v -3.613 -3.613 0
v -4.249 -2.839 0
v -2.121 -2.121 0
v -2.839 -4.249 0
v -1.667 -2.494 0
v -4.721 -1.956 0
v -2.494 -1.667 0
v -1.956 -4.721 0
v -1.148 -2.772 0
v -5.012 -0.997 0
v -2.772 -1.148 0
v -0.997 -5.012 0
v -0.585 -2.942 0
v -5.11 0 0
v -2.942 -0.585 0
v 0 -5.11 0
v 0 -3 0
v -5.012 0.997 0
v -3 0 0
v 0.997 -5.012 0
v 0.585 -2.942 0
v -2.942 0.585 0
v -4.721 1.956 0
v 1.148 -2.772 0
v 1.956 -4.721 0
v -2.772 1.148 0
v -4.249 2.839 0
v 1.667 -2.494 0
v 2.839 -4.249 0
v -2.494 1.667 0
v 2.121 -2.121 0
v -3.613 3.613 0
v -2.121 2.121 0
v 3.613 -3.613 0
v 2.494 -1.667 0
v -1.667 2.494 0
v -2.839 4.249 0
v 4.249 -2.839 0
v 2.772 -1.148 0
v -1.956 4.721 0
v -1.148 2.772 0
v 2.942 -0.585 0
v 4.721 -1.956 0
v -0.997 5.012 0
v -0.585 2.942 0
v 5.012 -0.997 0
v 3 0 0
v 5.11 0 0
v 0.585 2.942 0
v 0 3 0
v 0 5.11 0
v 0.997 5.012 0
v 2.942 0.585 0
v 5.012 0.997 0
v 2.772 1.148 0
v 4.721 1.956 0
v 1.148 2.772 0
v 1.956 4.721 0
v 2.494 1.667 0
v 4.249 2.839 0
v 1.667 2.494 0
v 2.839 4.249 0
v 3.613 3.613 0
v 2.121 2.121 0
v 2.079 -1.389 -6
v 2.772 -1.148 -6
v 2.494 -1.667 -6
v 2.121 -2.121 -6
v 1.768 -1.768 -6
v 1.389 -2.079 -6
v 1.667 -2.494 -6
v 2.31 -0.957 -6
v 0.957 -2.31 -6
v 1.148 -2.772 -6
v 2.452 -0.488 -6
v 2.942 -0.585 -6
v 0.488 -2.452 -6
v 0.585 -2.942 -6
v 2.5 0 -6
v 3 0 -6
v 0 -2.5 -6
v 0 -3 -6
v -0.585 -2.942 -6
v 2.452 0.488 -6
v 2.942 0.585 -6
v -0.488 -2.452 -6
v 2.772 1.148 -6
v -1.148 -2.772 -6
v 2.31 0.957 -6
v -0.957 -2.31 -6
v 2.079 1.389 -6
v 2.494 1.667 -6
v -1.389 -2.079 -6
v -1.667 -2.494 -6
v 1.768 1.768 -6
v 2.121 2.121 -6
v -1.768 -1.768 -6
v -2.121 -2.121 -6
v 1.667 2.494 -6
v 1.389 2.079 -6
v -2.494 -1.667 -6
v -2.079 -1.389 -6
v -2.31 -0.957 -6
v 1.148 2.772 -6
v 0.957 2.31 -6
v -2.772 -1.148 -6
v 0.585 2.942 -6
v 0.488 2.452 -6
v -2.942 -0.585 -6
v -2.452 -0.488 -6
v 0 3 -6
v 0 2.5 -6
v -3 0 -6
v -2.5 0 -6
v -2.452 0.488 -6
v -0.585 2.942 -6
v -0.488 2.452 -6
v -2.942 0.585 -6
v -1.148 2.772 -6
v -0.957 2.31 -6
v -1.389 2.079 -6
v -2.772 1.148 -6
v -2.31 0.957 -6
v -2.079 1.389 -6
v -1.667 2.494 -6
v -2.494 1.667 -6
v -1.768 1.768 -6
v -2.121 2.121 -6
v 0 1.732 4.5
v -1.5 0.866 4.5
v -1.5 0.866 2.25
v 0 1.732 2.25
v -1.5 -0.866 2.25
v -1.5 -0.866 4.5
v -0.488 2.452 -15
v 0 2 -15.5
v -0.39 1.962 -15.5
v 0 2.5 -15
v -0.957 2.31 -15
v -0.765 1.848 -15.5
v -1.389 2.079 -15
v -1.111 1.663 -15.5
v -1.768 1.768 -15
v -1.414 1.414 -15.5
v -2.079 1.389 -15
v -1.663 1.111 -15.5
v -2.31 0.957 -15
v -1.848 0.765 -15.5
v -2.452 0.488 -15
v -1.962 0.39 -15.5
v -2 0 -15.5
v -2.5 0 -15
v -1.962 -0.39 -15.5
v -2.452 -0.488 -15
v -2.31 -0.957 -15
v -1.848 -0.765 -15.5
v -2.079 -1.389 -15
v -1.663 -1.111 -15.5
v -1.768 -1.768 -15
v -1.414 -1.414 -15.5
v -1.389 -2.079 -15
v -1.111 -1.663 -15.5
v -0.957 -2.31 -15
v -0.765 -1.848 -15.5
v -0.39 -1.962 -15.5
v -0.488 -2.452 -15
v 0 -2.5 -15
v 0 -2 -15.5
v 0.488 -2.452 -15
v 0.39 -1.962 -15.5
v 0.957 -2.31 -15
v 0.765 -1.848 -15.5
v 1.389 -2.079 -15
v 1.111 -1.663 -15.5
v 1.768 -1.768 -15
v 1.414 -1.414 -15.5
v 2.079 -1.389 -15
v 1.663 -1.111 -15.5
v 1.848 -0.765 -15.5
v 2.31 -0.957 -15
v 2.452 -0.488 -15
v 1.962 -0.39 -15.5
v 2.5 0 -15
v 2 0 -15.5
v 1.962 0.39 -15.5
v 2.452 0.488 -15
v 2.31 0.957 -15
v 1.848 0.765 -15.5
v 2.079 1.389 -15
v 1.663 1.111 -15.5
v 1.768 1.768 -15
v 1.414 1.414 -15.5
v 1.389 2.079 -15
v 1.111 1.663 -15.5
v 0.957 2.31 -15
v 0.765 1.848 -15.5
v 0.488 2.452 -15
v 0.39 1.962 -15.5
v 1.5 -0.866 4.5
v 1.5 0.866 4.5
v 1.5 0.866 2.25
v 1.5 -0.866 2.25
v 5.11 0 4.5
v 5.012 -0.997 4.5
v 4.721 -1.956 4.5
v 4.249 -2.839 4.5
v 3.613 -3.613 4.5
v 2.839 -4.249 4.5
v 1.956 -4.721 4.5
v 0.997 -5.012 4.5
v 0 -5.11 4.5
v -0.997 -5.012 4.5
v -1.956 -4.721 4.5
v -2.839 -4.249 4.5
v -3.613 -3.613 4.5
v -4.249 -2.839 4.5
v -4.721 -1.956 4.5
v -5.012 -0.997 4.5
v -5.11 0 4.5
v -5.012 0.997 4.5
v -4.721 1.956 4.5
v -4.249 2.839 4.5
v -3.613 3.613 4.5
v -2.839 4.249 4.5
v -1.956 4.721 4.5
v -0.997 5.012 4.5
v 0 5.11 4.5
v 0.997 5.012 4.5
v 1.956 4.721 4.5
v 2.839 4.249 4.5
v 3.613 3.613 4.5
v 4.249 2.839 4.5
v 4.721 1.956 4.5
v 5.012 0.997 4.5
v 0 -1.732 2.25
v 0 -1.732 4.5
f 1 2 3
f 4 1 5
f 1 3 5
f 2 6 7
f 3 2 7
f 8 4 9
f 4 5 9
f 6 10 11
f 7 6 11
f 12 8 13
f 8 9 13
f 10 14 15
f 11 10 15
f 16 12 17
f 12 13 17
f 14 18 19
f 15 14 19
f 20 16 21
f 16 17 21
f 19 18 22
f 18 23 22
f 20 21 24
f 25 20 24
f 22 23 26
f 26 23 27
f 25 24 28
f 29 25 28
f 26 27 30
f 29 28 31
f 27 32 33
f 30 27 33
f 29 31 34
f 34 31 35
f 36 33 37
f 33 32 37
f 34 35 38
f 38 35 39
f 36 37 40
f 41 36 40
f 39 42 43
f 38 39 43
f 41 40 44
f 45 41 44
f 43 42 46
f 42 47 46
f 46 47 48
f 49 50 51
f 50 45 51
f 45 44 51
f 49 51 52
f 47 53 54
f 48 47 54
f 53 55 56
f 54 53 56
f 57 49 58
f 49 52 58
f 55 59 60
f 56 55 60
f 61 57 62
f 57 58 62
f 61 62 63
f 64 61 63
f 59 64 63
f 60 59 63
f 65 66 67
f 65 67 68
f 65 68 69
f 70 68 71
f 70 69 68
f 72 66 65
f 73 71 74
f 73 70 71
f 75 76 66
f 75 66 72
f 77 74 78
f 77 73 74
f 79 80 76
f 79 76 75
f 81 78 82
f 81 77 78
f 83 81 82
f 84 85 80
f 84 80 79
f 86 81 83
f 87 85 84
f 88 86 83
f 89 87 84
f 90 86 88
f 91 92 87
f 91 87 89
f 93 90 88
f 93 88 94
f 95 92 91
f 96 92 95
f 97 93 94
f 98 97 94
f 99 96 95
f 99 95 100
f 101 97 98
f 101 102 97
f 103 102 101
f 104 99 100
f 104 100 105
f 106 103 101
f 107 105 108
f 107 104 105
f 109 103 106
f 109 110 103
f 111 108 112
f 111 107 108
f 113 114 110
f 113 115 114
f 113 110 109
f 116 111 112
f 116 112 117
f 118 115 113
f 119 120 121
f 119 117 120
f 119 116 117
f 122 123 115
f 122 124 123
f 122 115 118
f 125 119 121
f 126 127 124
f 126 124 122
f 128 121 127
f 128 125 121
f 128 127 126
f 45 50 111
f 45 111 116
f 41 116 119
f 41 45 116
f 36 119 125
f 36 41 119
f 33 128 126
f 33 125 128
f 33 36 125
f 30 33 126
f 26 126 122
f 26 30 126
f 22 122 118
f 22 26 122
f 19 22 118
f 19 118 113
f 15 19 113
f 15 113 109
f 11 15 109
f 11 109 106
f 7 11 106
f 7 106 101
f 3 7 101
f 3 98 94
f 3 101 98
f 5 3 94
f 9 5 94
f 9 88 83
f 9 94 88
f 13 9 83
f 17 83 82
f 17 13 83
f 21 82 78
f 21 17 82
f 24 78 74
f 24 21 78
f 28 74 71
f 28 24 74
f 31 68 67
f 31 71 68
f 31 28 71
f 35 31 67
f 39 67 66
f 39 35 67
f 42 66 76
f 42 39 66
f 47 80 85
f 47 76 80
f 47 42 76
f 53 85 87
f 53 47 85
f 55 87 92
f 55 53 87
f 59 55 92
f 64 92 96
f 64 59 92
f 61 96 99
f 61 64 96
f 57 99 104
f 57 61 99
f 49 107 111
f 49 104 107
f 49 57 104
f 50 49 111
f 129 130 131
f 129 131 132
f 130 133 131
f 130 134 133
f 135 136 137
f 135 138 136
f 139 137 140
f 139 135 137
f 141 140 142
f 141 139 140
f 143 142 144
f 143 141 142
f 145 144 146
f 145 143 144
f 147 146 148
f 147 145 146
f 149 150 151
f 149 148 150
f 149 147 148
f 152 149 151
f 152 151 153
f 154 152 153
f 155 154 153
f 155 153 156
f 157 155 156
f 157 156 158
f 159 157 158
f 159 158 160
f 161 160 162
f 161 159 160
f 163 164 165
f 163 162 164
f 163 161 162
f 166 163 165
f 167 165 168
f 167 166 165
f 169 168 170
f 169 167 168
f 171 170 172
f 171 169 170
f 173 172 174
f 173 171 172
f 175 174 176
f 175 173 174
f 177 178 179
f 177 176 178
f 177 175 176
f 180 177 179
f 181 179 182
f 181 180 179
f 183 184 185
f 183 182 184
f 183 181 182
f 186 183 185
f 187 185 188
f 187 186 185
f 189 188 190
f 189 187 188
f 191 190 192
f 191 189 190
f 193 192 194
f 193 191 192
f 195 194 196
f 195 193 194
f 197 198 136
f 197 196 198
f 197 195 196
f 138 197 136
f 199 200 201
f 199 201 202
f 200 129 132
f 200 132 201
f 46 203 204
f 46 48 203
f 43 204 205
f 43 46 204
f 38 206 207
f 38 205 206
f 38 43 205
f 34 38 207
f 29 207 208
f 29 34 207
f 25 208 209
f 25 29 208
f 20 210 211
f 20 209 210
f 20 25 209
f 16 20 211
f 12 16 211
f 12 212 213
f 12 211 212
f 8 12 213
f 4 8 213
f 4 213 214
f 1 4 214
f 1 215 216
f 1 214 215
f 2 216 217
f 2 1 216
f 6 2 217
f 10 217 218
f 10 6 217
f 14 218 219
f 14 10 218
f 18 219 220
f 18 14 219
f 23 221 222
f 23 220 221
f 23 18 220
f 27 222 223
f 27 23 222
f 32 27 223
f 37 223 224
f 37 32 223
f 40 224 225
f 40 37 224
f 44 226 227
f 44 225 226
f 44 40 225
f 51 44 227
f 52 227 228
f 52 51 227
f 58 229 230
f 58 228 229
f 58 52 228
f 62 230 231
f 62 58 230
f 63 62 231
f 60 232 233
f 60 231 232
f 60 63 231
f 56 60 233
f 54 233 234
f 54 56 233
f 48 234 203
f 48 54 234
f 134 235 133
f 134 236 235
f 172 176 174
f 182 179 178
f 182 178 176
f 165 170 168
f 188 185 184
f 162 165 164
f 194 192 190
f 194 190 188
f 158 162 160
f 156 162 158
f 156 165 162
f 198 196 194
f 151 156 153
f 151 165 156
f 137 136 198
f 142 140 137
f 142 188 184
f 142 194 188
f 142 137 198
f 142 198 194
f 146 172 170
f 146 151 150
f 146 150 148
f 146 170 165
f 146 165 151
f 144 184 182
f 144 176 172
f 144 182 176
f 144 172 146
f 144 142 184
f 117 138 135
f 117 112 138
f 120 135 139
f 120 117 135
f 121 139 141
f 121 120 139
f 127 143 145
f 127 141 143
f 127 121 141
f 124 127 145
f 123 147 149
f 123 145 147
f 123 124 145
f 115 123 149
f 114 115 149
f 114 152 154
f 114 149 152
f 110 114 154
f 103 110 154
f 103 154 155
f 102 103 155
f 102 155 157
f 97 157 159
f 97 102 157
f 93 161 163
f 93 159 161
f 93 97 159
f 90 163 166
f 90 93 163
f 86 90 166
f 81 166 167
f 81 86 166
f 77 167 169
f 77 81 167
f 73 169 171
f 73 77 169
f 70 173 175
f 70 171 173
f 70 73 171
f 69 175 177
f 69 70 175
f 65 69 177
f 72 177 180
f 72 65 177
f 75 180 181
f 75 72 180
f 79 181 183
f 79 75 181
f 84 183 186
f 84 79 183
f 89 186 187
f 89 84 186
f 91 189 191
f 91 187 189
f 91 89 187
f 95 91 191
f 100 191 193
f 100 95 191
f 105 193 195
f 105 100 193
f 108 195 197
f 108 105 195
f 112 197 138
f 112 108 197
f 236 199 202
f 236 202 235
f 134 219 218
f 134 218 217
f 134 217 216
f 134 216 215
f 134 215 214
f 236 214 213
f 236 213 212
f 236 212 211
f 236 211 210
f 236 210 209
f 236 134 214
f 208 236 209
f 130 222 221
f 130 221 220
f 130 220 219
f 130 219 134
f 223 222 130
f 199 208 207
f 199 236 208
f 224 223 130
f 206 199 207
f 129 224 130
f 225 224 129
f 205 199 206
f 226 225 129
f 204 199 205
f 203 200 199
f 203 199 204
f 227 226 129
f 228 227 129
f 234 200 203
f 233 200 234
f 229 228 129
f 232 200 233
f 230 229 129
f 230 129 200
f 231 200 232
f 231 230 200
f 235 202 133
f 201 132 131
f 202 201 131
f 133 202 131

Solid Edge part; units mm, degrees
sketch "Sketch1" plane through (0, 0, 0) normal (0, 0, 1) x (1, 0, 0)
  circle A0 centre (0, 0) radius 5.11
  dimension "D1" = 10.22
extrude "Protrusion1" add sketch "Sketch1" along normal blind 4.5
sketch "Sketch2" plane through (0, 0, 4.5) normal (0, 0, 1) x (1, 0, 0)
  line L0 (0, -1.7321) -> (-1.5, -0.866)
  line L1 (-1.5, -0.866) -> (-1.5, 0.866)
  line L2 (-1.5, 0.866) -> (0, 1.7321)
  line L3 (0, 1.7321) -> (1.5, 0.866)
  line L4 (1.5, 0.866) -> (1.5, -0.866)
  line L5 (1.5, -0.866) -> (0, -1.7321)
  dimension "D1" = 3
extrude "Cutout1" cut sketch "Sketch2" against normal blind 2.25
sketch "Sketch3" plane through (0, 0, 0) normal (0, 0, -1) x (0, 1, 0)
  circle A0 centre (0, 0) radius 3
  dimension "D1" = 6
extrude "Protrusion2" add sketch "Sketch3" along normal blind 6
sketch "Sketch4" plane through (0, 0, -6) normal (0, 0, -1) x (0, 1, 0)
  circle A0 centre (0, 0) radius 2.5
  dimension "D1" = 5
extrude "Protrusion3" add sketch "Sketch4" along normal blind 9.5
chamfer "Chamfer1" distance 0.5 angle 45 1 edges at (0, -2.5, -15.5)
properties part number "24104609"
